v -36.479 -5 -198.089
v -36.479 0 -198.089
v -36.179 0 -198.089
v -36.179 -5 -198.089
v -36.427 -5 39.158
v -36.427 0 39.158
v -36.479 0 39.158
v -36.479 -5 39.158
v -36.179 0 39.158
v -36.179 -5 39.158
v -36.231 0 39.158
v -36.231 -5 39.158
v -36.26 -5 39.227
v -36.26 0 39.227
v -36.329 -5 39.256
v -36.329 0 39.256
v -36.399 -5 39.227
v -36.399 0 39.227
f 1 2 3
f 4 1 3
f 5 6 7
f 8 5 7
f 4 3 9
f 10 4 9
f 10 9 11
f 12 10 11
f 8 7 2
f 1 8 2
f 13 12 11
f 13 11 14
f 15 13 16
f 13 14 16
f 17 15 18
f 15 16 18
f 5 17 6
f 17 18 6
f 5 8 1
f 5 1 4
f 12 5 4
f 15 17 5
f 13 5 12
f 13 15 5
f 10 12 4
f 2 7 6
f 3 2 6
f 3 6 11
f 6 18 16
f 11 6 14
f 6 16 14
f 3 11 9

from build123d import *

# Parameters (mm, degrees)
F1_DEPTH = 5


with BuildPart() as f1:
    # F0 (on Front) → F1 (new body)
    with BuildSketch(Plane.XZ):
        with BuildLine():
            Line((-36.4274961966, 39.1578037006), (-36.3294929266, 39.1578037006))
            Line((-36.3294929266, 39.1578037006), (-36.2314896565, 39.1578037006))
            ThreePointArc((-36.2314896565, 39.1578037006), (-36.3294929266, 39.2558069707), (-36.4274961966, 39.1578037006))
        make_face()
        with BuildLine():
            Line((-36.2314896565, 39.1578037006), (-36.3294929266, 39.1578037006))
            Line((-36.3294929266, 39.1578037006), (-36.4274961966, 39.1578037006))
            ThreePointArc((-36.4274961966, 39.1578037006), (-36.3294929266, 39.0598004306), (-36.2314896565, 39.1578037006))
        make_face()
        with BuildLine():
            Line((-36.1794929266, 39.1578037006), (-36.2314896565, 39.1578037006))
            ThreePointArc((-36.2314896565, 39.1578037006), (-36.3294929266, 39.0598004306), (-36.4274961966, 39.1578037006))
            Line((-36.4274961966, 39.1578037006), (-36.4794929266, 39.1578037006))
            Line((-36.4794929266, 39.1578037006), (-36.4794929266, -198.0890776676))
            Line((-36.4794929266, -198.0890776676), (-36.1794929266, -198.0890776676))
            Line((-36.1794929266, -198.0890776676), (-36.1794929266, 39.1578037006))
        make_face()
    extrude(amount=F1_DEPTH)


solid = f1.part
